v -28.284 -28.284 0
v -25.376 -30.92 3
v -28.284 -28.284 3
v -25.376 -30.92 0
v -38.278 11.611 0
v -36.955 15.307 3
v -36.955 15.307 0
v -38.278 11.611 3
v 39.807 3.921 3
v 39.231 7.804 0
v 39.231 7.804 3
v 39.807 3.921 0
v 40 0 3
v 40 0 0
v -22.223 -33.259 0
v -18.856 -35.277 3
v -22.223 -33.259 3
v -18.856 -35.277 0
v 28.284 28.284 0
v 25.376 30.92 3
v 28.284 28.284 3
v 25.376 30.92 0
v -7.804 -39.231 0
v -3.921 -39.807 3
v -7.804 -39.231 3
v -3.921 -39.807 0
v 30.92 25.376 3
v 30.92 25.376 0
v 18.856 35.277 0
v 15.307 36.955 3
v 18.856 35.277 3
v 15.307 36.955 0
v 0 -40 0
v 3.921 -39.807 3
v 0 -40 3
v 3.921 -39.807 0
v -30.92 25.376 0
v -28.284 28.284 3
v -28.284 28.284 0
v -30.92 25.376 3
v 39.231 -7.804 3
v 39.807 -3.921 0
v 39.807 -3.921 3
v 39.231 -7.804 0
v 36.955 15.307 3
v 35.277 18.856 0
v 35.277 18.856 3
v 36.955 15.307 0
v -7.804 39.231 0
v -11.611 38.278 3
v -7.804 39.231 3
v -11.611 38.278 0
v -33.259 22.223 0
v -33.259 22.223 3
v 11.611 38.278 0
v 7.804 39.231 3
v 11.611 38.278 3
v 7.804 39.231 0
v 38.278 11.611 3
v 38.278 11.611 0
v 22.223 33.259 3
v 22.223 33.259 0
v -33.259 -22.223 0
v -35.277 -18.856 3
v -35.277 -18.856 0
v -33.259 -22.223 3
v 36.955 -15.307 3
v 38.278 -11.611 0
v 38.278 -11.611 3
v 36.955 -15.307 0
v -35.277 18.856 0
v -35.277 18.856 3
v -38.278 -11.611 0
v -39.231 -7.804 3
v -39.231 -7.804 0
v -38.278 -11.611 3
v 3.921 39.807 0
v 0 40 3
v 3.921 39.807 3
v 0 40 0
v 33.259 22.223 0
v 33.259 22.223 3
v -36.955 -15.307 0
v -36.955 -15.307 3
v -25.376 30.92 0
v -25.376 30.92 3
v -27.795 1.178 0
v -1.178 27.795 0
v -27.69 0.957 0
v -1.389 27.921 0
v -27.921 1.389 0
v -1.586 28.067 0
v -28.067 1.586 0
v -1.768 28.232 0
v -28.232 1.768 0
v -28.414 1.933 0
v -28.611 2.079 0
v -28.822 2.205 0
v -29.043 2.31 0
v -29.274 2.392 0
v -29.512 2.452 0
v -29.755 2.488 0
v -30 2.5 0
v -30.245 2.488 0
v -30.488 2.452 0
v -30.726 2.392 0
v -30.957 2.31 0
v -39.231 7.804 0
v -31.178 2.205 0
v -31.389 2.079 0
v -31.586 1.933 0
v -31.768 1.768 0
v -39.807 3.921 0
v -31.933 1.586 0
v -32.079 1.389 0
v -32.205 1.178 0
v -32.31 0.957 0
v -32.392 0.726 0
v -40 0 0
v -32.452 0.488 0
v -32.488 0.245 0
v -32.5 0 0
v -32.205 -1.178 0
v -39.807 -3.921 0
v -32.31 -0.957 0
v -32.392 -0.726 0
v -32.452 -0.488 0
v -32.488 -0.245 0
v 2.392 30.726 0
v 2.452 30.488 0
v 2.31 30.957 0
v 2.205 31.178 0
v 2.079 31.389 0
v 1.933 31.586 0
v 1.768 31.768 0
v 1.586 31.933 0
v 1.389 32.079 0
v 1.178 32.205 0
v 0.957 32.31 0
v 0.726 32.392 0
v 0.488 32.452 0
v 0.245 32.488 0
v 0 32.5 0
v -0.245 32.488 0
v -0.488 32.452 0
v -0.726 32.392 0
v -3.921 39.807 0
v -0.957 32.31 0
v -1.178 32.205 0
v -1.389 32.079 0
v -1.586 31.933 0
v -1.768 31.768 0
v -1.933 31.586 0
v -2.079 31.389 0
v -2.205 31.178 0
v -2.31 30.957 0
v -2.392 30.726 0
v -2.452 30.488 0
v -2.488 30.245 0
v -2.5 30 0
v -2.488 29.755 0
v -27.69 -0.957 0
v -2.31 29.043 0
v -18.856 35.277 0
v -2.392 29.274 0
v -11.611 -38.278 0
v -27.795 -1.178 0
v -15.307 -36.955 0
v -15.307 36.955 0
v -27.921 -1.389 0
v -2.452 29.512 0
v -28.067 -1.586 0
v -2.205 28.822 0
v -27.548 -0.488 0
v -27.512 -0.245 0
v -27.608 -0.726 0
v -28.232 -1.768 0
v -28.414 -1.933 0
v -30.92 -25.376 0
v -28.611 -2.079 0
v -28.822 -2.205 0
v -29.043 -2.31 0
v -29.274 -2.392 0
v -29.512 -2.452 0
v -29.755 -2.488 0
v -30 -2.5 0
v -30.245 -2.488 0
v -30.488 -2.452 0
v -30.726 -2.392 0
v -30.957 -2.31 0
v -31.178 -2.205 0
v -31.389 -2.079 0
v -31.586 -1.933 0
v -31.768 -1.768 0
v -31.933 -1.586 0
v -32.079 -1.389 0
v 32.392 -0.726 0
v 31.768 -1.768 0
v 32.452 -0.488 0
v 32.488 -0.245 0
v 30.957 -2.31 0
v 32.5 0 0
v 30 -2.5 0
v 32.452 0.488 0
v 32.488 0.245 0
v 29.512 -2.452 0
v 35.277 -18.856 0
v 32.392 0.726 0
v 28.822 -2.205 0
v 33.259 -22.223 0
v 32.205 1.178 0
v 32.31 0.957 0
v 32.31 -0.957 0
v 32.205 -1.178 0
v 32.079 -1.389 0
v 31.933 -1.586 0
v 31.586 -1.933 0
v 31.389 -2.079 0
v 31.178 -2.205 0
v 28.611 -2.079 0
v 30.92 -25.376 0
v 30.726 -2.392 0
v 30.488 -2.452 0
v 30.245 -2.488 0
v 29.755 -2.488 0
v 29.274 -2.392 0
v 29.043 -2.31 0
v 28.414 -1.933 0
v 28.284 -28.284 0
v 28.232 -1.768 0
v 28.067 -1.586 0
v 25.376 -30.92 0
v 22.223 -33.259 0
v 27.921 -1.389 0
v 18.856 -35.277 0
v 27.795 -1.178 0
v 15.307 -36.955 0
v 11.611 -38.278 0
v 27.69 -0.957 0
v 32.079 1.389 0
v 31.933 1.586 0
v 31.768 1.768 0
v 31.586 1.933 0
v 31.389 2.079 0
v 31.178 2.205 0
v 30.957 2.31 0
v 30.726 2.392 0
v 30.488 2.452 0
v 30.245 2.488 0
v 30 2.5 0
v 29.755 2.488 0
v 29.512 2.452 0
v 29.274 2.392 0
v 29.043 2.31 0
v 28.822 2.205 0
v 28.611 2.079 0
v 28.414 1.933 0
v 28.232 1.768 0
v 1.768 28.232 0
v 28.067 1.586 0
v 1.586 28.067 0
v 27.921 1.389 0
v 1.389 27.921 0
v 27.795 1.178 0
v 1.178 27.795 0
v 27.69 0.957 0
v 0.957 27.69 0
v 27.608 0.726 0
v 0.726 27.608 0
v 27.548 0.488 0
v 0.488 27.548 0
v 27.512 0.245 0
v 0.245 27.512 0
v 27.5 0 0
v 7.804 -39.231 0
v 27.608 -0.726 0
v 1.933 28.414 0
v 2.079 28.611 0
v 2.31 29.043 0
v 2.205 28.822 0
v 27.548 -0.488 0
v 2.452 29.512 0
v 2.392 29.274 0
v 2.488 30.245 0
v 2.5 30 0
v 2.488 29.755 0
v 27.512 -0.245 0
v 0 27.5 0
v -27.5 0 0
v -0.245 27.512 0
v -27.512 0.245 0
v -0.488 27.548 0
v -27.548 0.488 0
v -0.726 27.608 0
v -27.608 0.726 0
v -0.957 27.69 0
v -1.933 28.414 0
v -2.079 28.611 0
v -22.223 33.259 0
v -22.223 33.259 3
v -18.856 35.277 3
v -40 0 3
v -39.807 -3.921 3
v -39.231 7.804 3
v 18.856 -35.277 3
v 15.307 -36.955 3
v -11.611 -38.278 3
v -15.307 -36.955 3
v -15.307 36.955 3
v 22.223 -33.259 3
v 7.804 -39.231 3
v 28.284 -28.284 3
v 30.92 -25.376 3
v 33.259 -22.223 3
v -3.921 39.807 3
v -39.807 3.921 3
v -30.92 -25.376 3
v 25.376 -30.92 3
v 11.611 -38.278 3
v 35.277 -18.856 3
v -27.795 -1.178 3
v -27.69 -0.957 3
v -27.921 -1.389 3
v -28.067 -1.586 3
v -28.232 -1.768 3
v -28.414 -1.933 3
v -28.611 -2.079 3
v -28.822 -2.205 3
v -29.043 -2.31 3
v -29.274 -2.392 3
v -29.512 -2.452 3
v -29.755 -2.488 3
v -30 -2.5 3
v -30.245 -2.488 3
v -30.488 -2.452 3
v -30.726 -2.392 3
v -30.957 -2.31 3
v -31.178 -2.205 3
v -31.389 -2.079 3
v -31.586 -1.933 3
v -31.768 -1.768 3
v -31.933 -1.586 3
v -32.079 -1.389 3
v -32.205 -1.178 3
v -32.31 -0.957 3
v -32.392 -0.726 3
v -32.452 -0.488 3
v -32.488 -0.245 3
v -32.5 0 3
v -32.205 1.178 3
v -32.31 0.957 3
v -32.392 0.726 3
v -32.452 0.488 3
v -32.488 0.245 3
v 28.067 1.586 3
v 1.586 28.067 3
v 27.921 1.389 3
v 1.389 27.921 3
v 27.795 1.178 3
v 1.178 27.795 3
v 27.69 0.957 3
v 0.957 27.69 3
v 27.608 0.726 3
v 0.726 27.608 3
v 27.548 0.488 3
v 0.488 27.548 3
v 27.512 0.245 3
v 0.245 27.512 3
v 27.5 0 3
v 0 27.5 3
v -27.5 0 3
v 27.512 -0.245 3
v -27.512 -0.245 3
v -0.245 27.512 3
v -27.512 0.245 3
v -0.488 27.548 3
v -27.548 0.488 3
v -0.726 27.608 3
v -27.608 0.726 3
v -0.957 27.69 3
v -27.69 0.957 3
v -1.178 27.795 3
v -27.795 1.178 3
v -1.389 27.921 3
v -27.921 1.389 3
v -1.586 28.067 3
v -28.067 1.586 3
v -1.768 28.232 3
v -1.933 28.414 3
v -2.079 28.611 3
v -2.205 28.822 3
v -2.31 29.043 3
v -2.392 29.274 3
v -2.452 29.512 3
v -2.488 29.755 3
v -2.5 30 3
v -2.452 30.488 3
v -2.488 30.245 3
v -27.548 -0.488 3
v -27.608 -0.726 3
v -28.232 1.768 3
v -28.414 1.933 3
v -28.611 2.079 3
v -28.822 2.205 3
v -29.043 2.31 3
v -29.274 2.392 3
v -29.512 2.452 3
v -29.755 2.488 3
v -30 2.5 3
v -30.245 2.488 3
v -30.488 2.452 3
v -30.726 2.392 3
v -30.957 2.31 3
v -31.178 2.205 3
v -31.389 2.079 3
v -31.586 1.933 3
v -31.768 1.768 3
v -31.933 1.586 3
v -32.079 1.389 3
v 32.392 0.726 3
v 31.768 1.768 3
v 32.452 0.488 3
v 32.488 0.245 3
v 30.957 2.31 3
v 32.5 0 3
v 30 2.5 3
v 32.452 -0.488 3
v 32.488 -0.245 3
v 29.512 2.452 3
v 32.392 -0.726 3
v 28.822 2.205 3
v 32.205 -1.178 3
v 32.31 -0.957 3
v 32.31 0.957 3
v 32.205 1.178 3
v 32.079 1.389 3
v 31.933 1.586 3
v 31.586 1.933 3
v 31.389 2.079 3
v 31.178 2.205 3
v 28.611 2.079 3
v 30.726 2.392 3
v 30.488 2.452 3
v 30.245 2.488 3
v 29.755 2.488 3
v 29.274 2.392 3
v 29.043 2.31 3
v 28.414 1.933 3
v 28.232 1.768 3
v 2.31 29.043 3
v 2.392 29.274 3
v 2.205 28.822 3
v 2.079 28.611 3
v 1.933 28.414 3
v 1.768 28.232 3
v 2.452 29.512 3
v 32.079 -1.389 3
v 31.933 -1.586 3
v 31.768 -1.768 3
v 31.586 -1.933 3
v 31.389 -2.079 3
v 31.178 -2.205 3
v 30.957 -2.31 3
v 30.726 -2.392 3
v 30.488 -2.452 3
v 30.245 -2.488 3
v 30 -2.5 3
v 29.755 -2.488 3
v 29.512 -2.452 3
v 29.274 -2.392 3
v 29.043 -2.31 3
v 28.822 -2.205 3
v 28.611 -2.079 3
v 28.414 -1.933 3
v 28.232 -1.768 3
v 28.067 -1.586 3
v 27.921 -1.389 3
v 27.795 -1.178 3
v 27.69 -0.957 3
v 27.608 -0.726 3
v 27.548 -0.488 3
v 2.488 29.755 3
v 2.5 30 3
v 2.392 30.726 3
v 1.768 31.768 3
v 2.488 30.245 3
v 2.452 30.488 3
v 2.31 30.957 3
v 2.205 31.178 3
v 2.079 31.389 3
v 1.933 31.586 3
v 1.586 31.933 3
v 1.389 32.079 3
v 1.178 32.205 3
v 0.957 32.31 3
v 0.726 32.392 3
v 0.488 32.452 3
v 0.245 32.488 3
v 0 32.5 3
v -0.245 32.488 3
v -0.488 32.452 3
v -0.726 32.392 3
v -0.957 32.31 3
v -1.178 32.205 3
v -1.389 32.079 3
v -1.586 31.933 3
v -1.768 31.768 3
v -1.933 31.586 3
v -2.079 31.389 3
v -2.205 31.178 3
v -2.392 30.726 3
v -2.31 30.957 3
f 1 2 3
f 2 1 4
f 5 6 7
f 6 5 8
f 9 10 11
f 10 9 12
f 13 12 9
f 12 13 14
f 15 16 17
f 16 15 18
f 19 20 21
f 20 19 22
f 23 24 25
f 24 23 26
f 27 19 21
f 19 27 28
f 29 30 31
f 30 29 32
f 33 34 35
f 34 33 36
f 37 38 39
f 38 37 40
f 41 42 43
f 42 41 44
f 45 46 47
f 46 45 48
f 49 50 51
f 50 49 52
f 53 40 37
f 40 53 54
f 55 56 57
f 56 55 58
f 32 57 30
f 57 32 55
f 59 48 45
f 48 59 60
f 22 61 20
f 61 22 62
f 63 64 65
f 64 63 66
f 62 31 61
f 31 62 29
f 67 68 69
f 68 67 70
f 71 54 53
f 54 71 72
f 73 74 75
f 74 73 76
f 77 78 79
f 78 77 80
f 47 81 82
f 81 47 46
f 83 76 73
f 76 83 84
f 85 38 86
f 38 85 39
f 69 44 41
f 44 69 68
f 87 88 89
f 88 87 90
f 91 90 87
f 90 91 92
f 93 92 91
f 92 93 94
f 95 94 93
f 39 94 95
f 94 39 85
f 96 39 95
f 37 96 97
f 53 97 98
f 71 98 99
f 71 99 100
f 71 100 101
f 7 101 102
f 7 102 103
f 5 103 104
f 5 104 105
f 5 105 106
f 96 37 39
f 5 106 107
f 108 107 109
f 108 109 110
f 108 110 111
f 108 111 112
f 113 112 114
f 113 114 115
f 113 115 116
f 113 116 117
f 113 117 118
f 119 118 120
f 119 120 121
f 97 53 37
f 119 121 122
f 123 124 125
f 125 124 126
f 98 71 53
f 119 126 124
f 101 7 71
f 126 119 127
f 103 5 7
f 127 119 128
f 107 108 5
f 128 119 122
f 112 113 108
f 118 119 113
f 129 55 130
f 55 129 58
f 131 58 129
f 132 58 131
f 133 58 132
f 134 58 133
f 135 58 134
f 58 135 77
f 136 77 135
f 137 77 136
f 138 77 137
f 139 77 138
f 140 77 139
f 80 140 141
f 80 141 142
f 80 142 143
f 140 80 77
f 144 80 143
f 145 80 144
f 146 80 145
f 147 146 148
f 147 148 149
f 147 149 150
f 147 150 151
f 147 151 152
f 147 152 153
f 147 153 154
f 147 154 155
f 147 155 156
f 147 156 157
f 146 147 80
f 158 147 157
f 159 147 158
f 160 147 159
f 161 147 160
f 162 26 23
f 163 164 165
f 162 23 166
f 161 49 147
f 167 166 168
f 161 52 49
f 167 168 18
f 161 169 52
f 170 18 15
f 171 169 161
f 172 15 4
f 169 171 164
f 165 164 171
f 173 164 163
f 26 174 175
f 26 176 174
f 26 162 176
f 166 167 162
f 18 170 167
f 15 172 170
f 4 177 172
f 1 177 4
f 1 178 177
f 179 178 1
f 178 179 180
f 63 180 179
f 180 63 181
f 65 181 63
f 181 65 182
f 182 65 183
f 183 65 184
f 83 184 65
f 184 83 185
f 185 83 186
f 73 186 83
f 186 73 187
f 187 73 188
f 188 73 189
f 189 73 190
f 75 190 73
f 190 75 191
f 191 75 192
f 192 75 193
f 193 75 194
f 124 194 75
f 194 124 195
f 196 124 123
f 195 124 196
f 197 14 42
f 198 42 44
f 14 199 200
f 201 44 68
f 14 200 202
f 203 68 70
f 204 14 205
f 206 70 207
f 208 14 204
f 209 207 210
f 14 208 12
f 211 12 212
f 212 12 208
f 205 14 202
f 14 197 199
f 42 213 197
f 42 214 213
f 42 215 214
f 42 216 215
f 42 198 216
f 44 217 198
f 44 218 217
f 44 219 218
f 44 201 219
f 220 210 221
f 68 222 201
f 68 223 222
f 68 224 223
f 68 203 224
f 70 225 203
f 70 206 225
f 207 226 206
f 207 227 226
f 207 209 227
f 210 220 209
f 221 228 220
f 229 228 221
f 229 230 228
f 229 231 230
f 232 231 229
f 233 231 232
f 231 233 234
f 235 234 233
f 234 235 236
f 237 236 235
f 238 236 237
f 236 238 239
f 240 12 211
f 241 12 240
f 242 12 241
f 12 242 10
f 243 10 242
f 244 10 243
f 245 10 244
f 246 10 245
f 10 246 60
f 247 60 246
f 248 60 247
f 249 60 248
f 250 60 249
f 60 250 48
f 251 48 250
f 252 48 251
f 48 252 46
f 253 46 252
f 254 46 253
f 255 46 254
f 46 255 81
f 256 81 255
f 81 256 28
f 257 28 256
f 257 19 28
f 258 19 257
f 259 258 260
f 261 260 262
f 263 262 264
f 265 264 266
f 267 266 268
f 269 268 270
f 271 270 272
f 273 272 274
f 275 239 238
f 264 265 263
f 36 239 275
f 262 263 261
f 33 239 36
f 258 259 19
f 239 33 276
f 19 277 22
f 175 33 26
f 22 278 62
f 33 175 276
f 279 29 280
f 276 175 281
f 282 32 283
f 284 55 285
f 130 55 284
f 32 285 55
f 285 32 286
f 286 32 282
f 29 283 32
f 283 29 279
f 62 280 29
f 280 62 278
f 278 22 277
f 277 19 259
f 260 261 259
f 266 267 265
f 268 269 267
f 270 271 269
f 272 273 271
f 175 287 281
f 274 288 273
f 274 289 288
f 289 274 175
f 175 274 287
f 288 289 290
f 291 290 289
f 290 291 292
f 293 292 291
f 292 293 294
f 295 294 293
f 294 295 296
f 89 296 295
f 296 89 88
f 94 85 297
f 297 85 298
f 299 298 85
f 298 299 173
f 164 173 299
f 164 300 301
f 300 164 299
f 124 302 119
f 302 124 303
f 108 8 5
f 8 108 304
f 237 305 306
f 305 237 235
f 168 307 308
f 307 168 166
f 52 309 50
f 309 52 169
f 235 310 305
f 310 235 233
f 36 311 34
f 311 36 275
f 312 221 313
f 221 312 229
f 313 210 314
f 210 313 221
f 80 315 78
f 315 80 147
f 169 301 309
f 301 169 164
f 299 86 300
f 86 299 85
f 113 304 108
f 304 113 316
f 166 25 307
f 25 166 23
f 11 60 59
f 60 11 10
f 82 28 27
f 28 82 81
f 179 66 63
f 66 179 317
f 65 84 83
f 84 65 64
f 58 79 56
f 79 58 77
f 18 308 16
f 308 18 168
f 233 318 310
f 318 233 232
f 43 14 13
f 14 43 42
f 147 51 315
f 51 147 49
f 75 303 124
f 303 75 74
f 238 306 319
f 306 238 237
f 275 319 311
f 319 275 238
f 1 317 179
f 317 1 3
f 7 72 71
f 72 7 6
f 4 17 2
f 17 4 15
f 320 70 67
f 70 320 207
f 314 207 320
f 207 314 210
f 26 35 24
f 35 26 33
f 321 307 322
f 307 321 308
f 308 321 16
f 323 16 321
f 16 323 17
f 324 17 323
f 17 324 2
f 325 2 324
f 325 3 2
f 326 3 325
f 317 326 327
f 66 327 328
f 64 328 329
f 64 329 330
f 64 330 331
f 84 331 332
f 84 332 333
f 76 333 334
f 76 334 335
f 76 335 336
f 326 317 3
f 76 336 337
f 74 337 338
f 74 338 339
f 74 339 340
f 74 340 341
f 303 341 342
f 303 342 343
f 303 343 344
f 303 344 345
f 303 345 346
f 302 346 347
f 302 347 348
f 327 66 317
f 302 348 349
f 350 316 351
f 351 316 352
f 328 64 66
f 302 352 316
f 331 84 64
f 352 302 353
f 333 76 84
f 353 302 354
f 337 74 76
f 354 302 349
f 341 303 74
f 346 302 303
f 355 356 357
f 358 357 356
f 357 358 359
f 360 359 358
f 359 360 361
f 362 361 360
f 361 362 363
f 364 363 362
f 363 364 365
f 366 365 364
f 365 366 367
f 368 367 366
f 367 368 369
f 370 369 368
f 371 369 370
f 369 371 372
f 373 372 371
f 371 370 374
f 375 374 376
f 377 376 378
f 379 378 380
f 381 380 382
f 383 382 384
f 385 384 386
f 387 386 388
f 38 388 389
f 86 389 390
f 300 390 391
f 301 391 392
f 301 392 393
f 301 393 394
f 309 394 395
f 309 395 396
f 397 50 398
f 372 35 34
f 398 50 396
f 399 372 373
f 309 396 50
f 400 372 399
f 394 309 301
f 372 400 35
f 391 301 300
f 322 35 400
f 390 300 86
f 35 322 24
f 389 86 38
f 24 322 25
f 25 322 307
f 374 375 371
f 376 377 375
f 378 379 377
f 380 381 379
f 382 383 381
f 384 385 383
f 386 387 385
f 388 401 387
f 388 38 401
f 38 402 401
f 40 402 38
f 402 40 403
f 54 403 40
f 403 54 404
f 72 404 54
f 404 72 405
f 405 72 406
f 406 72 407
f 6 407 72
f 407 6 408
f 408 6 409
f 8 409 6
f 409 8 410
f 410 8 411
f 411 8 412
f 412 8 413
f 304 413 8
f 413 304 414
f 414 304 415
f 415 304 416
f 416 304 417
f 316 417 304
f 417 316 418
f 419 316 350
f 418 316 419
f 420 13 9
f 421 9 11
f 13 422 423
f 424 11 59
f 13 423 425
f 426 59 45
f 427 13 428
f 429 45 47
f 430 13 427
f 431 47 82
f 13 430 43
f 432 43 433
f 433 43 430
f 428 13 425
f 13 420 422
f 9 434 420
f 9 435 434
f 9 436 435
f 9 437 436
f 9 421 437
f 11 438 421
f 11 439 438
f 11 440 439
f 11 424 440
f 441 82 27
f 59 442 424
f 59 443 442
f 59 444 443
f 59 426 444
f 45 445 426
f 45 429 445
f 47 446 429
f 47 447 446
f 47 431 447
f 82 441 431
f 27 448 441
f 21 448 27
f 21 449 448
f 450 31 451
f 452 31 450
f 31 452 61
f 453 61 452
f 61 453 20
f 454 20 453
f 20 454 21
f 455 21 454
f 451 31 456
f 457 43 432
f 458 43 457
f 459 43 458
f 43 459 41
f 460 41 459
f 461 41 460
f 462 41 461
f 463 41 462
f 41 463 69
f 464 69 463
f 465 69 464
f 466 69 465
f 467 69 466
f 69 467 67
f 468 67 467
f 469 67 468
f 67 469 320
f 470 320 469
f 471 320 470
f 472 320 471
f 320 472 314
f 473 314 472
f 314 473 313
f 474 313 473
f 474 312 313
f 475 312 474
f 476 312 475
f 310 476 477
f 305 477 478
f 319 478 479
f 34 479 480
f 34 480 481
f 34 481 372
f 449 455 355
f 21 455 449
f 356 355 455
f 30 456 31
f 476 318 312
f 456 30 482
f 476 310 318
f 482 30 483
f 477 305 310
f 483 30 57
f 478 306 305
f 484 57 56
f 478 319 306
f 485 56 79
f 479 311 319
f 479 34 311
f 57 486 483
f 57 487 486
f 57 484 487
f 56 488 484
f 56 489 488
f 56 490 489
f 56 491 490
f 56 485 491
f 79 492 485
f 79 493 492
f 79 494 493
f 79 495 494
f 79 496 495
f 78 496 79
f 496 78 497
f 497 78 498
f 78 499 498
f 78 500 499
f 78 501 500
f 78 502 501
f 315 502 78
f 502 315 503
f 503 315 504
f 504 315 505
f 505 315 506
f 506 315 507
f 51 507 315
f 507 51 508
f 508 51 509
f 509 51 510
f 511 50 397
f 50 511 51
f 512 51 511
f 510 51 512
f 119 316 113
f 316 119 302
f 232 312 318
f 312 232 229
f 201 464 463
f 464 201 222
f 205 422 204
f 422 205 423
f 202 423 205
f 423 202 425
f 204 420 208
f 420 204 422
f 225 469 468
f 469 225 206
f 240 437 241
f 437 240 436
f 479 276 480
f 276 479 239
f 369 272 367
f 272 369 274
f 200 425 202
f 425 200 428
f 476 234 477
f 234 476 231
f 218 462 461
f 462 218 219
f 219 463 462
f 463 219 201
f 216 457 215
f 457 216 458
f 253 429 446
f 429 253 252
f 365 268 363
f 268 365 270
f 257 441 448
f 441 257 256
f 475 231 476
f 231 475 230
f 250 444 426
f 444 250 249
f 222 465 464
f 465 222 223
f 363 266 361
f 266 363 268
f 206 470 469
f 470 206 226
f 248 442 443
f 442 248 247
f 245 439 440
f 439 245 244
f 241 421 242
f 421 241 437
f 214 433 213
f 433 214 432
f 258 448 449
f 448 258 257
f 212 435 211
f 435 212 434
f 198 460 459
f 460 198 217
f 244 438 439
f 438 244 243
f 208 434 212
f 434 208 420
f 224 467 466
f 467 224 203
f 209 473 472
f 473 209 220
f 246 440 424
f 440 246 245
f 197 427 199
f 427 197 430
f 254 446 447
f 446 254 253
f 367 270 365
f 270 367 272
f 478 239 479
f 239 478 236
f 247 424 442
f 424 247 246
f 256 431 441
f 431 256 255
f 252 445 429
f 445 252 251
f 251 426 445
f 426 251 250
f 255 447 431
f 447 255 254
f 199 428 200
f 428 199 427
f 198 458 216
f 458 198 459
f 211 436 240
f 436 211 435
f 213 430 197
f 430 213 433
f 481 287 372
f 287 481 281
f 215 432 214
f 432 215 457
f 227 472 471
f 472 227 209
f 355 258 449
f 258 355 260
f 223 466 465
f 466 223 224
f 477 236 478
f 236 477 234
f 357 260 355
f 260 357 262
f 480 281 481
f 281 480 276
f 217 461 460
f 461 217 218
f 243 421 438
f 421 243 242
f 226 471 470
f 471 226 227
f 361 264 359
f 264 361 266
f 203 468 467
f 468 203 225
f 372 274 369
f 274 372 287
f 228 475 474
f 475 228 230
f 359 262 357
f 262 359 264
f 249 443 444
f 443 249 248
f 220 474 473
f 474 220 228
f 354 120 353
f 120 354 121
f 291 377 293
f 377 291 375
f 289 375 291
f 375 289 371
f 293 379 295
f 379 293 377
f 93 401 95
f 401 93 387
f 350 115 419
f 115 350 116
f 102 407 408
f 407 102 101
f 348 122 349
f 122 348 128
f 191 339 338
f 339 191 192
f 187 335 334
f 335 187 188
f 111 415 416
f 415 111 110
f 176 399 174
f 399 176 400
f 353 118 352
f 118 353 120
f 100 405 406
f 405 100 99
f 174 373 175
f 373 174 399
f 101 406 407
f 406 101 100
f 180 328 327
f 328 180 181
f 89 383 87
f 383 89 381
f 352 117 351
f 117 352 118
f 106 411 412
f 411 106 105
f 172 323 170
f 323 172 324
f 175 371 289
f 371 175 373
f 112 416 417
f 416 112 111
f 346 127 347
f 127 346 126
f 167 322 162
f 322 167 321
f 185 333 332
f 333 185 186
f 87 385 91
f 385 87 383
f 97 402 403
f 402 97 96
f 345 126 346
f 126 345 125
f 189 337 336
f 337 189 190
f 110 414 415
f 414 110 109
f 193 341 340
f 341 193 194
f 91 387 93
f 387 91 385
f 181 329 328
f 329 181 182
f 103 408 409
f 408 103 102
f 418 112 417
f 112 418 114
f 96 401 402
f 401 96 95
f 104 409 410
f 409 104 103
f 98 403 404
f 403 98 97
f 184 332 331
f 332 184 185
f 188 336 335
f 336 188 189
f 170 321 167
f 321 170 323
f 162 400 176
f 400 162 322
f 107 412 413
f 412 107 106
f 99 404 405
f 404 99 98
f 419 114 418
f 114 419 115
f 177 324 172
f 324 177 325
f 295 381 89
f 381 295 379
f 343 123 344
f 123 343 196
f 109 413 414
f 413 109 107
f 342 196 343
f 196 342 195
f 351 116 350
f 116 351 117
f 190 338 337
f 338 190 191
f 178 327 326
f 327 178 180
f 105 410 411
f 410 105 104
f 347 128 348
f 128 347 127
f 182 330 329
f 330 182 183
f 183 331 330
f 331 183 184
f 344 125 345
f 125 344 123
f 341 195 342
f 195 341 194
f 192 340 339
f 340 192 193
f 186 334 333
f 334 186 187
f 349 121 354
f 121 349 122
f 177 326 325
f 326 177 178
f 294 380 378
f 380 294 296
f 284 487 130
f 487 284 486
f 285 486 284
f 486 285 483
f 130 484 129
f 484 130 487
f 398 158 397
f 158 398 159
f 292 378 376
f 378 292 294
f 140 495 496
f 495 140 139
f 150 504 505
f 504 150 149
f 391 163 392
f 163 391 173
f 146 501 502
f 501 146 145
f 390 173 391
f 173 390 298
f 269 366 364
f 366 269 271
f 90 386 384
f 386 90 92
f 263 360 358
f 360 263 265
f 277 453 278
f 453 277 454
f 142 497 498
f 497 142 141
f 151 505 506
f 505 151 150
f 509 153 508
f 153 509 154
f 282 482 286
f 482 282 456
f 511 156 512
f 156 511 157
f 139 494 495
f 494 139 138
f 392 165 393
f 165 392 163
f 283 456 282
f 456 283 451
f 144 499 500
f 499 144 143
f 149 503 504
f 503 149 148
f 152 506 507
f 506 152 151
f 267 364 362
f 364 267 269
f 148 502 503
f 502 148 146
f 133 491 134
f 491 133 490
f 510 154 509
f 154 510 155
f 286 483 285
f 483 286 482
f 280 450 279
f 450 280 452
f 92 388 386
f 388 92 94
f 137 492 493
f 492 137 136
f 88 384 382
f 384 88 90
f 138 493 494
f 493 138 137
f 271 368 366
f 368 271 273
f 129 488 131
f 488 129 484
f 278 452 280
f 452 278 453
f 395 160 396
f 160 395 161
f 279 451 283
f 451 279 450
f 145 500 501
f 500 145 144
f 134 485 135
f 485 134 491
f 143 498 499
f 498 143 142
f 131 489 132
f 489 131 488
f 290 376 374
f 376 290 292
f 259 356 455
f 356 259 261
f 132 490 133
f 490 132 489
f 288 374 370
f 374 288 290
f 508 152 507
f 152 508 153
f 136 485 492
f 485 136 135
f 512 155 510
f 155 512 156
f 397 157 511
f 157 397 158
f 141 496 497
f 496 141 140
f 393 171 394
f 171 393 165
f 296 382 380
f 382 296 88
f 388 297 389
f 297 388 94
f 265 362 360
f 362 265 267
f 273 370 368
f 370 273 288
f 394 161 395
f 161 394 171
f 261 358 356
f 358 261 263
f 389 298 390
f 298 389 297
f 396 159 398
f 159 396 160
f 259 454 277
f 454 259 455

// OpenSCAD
    $fn= 64;
difference() {
    cylinder(3, 40, 40);
    translate([30,0,-5]) cylinder(15, 2.5, 2.5);
    translate([-30,0,-5]) cylinder(15, 2.5, 2.5);
    translate([0,30,-5]) cylinder(15, 2.5, 2.5);

}
//difference() {
//    cylinder(20, 15, 15);
//    cylinder(25, 10, 10);
//    translate([-10,0,0]) cube([20, 20, 25]);
//
//    translate([-15,3,0]) cube([30, 30, 25]);
//
//}
//translate([-15,0,0]) cube([5, 10, 20]);
//translate([10,0,0]) cube([5, 10, 20]);

//translate([-12.5,10,0]) cylinder(20, 2.5, 2.5);
//translate([12.5,10,0]) cylinder(20, 2.5, 2.5);
//
//difference() {
//    translate([-2.5,-35,0]) cube([5, 25, 20]);
//    translate([-10,-34.5,25.5]) rotate([90,0,90]) cylinder(20, 20.5, 20.5);
//
//}
